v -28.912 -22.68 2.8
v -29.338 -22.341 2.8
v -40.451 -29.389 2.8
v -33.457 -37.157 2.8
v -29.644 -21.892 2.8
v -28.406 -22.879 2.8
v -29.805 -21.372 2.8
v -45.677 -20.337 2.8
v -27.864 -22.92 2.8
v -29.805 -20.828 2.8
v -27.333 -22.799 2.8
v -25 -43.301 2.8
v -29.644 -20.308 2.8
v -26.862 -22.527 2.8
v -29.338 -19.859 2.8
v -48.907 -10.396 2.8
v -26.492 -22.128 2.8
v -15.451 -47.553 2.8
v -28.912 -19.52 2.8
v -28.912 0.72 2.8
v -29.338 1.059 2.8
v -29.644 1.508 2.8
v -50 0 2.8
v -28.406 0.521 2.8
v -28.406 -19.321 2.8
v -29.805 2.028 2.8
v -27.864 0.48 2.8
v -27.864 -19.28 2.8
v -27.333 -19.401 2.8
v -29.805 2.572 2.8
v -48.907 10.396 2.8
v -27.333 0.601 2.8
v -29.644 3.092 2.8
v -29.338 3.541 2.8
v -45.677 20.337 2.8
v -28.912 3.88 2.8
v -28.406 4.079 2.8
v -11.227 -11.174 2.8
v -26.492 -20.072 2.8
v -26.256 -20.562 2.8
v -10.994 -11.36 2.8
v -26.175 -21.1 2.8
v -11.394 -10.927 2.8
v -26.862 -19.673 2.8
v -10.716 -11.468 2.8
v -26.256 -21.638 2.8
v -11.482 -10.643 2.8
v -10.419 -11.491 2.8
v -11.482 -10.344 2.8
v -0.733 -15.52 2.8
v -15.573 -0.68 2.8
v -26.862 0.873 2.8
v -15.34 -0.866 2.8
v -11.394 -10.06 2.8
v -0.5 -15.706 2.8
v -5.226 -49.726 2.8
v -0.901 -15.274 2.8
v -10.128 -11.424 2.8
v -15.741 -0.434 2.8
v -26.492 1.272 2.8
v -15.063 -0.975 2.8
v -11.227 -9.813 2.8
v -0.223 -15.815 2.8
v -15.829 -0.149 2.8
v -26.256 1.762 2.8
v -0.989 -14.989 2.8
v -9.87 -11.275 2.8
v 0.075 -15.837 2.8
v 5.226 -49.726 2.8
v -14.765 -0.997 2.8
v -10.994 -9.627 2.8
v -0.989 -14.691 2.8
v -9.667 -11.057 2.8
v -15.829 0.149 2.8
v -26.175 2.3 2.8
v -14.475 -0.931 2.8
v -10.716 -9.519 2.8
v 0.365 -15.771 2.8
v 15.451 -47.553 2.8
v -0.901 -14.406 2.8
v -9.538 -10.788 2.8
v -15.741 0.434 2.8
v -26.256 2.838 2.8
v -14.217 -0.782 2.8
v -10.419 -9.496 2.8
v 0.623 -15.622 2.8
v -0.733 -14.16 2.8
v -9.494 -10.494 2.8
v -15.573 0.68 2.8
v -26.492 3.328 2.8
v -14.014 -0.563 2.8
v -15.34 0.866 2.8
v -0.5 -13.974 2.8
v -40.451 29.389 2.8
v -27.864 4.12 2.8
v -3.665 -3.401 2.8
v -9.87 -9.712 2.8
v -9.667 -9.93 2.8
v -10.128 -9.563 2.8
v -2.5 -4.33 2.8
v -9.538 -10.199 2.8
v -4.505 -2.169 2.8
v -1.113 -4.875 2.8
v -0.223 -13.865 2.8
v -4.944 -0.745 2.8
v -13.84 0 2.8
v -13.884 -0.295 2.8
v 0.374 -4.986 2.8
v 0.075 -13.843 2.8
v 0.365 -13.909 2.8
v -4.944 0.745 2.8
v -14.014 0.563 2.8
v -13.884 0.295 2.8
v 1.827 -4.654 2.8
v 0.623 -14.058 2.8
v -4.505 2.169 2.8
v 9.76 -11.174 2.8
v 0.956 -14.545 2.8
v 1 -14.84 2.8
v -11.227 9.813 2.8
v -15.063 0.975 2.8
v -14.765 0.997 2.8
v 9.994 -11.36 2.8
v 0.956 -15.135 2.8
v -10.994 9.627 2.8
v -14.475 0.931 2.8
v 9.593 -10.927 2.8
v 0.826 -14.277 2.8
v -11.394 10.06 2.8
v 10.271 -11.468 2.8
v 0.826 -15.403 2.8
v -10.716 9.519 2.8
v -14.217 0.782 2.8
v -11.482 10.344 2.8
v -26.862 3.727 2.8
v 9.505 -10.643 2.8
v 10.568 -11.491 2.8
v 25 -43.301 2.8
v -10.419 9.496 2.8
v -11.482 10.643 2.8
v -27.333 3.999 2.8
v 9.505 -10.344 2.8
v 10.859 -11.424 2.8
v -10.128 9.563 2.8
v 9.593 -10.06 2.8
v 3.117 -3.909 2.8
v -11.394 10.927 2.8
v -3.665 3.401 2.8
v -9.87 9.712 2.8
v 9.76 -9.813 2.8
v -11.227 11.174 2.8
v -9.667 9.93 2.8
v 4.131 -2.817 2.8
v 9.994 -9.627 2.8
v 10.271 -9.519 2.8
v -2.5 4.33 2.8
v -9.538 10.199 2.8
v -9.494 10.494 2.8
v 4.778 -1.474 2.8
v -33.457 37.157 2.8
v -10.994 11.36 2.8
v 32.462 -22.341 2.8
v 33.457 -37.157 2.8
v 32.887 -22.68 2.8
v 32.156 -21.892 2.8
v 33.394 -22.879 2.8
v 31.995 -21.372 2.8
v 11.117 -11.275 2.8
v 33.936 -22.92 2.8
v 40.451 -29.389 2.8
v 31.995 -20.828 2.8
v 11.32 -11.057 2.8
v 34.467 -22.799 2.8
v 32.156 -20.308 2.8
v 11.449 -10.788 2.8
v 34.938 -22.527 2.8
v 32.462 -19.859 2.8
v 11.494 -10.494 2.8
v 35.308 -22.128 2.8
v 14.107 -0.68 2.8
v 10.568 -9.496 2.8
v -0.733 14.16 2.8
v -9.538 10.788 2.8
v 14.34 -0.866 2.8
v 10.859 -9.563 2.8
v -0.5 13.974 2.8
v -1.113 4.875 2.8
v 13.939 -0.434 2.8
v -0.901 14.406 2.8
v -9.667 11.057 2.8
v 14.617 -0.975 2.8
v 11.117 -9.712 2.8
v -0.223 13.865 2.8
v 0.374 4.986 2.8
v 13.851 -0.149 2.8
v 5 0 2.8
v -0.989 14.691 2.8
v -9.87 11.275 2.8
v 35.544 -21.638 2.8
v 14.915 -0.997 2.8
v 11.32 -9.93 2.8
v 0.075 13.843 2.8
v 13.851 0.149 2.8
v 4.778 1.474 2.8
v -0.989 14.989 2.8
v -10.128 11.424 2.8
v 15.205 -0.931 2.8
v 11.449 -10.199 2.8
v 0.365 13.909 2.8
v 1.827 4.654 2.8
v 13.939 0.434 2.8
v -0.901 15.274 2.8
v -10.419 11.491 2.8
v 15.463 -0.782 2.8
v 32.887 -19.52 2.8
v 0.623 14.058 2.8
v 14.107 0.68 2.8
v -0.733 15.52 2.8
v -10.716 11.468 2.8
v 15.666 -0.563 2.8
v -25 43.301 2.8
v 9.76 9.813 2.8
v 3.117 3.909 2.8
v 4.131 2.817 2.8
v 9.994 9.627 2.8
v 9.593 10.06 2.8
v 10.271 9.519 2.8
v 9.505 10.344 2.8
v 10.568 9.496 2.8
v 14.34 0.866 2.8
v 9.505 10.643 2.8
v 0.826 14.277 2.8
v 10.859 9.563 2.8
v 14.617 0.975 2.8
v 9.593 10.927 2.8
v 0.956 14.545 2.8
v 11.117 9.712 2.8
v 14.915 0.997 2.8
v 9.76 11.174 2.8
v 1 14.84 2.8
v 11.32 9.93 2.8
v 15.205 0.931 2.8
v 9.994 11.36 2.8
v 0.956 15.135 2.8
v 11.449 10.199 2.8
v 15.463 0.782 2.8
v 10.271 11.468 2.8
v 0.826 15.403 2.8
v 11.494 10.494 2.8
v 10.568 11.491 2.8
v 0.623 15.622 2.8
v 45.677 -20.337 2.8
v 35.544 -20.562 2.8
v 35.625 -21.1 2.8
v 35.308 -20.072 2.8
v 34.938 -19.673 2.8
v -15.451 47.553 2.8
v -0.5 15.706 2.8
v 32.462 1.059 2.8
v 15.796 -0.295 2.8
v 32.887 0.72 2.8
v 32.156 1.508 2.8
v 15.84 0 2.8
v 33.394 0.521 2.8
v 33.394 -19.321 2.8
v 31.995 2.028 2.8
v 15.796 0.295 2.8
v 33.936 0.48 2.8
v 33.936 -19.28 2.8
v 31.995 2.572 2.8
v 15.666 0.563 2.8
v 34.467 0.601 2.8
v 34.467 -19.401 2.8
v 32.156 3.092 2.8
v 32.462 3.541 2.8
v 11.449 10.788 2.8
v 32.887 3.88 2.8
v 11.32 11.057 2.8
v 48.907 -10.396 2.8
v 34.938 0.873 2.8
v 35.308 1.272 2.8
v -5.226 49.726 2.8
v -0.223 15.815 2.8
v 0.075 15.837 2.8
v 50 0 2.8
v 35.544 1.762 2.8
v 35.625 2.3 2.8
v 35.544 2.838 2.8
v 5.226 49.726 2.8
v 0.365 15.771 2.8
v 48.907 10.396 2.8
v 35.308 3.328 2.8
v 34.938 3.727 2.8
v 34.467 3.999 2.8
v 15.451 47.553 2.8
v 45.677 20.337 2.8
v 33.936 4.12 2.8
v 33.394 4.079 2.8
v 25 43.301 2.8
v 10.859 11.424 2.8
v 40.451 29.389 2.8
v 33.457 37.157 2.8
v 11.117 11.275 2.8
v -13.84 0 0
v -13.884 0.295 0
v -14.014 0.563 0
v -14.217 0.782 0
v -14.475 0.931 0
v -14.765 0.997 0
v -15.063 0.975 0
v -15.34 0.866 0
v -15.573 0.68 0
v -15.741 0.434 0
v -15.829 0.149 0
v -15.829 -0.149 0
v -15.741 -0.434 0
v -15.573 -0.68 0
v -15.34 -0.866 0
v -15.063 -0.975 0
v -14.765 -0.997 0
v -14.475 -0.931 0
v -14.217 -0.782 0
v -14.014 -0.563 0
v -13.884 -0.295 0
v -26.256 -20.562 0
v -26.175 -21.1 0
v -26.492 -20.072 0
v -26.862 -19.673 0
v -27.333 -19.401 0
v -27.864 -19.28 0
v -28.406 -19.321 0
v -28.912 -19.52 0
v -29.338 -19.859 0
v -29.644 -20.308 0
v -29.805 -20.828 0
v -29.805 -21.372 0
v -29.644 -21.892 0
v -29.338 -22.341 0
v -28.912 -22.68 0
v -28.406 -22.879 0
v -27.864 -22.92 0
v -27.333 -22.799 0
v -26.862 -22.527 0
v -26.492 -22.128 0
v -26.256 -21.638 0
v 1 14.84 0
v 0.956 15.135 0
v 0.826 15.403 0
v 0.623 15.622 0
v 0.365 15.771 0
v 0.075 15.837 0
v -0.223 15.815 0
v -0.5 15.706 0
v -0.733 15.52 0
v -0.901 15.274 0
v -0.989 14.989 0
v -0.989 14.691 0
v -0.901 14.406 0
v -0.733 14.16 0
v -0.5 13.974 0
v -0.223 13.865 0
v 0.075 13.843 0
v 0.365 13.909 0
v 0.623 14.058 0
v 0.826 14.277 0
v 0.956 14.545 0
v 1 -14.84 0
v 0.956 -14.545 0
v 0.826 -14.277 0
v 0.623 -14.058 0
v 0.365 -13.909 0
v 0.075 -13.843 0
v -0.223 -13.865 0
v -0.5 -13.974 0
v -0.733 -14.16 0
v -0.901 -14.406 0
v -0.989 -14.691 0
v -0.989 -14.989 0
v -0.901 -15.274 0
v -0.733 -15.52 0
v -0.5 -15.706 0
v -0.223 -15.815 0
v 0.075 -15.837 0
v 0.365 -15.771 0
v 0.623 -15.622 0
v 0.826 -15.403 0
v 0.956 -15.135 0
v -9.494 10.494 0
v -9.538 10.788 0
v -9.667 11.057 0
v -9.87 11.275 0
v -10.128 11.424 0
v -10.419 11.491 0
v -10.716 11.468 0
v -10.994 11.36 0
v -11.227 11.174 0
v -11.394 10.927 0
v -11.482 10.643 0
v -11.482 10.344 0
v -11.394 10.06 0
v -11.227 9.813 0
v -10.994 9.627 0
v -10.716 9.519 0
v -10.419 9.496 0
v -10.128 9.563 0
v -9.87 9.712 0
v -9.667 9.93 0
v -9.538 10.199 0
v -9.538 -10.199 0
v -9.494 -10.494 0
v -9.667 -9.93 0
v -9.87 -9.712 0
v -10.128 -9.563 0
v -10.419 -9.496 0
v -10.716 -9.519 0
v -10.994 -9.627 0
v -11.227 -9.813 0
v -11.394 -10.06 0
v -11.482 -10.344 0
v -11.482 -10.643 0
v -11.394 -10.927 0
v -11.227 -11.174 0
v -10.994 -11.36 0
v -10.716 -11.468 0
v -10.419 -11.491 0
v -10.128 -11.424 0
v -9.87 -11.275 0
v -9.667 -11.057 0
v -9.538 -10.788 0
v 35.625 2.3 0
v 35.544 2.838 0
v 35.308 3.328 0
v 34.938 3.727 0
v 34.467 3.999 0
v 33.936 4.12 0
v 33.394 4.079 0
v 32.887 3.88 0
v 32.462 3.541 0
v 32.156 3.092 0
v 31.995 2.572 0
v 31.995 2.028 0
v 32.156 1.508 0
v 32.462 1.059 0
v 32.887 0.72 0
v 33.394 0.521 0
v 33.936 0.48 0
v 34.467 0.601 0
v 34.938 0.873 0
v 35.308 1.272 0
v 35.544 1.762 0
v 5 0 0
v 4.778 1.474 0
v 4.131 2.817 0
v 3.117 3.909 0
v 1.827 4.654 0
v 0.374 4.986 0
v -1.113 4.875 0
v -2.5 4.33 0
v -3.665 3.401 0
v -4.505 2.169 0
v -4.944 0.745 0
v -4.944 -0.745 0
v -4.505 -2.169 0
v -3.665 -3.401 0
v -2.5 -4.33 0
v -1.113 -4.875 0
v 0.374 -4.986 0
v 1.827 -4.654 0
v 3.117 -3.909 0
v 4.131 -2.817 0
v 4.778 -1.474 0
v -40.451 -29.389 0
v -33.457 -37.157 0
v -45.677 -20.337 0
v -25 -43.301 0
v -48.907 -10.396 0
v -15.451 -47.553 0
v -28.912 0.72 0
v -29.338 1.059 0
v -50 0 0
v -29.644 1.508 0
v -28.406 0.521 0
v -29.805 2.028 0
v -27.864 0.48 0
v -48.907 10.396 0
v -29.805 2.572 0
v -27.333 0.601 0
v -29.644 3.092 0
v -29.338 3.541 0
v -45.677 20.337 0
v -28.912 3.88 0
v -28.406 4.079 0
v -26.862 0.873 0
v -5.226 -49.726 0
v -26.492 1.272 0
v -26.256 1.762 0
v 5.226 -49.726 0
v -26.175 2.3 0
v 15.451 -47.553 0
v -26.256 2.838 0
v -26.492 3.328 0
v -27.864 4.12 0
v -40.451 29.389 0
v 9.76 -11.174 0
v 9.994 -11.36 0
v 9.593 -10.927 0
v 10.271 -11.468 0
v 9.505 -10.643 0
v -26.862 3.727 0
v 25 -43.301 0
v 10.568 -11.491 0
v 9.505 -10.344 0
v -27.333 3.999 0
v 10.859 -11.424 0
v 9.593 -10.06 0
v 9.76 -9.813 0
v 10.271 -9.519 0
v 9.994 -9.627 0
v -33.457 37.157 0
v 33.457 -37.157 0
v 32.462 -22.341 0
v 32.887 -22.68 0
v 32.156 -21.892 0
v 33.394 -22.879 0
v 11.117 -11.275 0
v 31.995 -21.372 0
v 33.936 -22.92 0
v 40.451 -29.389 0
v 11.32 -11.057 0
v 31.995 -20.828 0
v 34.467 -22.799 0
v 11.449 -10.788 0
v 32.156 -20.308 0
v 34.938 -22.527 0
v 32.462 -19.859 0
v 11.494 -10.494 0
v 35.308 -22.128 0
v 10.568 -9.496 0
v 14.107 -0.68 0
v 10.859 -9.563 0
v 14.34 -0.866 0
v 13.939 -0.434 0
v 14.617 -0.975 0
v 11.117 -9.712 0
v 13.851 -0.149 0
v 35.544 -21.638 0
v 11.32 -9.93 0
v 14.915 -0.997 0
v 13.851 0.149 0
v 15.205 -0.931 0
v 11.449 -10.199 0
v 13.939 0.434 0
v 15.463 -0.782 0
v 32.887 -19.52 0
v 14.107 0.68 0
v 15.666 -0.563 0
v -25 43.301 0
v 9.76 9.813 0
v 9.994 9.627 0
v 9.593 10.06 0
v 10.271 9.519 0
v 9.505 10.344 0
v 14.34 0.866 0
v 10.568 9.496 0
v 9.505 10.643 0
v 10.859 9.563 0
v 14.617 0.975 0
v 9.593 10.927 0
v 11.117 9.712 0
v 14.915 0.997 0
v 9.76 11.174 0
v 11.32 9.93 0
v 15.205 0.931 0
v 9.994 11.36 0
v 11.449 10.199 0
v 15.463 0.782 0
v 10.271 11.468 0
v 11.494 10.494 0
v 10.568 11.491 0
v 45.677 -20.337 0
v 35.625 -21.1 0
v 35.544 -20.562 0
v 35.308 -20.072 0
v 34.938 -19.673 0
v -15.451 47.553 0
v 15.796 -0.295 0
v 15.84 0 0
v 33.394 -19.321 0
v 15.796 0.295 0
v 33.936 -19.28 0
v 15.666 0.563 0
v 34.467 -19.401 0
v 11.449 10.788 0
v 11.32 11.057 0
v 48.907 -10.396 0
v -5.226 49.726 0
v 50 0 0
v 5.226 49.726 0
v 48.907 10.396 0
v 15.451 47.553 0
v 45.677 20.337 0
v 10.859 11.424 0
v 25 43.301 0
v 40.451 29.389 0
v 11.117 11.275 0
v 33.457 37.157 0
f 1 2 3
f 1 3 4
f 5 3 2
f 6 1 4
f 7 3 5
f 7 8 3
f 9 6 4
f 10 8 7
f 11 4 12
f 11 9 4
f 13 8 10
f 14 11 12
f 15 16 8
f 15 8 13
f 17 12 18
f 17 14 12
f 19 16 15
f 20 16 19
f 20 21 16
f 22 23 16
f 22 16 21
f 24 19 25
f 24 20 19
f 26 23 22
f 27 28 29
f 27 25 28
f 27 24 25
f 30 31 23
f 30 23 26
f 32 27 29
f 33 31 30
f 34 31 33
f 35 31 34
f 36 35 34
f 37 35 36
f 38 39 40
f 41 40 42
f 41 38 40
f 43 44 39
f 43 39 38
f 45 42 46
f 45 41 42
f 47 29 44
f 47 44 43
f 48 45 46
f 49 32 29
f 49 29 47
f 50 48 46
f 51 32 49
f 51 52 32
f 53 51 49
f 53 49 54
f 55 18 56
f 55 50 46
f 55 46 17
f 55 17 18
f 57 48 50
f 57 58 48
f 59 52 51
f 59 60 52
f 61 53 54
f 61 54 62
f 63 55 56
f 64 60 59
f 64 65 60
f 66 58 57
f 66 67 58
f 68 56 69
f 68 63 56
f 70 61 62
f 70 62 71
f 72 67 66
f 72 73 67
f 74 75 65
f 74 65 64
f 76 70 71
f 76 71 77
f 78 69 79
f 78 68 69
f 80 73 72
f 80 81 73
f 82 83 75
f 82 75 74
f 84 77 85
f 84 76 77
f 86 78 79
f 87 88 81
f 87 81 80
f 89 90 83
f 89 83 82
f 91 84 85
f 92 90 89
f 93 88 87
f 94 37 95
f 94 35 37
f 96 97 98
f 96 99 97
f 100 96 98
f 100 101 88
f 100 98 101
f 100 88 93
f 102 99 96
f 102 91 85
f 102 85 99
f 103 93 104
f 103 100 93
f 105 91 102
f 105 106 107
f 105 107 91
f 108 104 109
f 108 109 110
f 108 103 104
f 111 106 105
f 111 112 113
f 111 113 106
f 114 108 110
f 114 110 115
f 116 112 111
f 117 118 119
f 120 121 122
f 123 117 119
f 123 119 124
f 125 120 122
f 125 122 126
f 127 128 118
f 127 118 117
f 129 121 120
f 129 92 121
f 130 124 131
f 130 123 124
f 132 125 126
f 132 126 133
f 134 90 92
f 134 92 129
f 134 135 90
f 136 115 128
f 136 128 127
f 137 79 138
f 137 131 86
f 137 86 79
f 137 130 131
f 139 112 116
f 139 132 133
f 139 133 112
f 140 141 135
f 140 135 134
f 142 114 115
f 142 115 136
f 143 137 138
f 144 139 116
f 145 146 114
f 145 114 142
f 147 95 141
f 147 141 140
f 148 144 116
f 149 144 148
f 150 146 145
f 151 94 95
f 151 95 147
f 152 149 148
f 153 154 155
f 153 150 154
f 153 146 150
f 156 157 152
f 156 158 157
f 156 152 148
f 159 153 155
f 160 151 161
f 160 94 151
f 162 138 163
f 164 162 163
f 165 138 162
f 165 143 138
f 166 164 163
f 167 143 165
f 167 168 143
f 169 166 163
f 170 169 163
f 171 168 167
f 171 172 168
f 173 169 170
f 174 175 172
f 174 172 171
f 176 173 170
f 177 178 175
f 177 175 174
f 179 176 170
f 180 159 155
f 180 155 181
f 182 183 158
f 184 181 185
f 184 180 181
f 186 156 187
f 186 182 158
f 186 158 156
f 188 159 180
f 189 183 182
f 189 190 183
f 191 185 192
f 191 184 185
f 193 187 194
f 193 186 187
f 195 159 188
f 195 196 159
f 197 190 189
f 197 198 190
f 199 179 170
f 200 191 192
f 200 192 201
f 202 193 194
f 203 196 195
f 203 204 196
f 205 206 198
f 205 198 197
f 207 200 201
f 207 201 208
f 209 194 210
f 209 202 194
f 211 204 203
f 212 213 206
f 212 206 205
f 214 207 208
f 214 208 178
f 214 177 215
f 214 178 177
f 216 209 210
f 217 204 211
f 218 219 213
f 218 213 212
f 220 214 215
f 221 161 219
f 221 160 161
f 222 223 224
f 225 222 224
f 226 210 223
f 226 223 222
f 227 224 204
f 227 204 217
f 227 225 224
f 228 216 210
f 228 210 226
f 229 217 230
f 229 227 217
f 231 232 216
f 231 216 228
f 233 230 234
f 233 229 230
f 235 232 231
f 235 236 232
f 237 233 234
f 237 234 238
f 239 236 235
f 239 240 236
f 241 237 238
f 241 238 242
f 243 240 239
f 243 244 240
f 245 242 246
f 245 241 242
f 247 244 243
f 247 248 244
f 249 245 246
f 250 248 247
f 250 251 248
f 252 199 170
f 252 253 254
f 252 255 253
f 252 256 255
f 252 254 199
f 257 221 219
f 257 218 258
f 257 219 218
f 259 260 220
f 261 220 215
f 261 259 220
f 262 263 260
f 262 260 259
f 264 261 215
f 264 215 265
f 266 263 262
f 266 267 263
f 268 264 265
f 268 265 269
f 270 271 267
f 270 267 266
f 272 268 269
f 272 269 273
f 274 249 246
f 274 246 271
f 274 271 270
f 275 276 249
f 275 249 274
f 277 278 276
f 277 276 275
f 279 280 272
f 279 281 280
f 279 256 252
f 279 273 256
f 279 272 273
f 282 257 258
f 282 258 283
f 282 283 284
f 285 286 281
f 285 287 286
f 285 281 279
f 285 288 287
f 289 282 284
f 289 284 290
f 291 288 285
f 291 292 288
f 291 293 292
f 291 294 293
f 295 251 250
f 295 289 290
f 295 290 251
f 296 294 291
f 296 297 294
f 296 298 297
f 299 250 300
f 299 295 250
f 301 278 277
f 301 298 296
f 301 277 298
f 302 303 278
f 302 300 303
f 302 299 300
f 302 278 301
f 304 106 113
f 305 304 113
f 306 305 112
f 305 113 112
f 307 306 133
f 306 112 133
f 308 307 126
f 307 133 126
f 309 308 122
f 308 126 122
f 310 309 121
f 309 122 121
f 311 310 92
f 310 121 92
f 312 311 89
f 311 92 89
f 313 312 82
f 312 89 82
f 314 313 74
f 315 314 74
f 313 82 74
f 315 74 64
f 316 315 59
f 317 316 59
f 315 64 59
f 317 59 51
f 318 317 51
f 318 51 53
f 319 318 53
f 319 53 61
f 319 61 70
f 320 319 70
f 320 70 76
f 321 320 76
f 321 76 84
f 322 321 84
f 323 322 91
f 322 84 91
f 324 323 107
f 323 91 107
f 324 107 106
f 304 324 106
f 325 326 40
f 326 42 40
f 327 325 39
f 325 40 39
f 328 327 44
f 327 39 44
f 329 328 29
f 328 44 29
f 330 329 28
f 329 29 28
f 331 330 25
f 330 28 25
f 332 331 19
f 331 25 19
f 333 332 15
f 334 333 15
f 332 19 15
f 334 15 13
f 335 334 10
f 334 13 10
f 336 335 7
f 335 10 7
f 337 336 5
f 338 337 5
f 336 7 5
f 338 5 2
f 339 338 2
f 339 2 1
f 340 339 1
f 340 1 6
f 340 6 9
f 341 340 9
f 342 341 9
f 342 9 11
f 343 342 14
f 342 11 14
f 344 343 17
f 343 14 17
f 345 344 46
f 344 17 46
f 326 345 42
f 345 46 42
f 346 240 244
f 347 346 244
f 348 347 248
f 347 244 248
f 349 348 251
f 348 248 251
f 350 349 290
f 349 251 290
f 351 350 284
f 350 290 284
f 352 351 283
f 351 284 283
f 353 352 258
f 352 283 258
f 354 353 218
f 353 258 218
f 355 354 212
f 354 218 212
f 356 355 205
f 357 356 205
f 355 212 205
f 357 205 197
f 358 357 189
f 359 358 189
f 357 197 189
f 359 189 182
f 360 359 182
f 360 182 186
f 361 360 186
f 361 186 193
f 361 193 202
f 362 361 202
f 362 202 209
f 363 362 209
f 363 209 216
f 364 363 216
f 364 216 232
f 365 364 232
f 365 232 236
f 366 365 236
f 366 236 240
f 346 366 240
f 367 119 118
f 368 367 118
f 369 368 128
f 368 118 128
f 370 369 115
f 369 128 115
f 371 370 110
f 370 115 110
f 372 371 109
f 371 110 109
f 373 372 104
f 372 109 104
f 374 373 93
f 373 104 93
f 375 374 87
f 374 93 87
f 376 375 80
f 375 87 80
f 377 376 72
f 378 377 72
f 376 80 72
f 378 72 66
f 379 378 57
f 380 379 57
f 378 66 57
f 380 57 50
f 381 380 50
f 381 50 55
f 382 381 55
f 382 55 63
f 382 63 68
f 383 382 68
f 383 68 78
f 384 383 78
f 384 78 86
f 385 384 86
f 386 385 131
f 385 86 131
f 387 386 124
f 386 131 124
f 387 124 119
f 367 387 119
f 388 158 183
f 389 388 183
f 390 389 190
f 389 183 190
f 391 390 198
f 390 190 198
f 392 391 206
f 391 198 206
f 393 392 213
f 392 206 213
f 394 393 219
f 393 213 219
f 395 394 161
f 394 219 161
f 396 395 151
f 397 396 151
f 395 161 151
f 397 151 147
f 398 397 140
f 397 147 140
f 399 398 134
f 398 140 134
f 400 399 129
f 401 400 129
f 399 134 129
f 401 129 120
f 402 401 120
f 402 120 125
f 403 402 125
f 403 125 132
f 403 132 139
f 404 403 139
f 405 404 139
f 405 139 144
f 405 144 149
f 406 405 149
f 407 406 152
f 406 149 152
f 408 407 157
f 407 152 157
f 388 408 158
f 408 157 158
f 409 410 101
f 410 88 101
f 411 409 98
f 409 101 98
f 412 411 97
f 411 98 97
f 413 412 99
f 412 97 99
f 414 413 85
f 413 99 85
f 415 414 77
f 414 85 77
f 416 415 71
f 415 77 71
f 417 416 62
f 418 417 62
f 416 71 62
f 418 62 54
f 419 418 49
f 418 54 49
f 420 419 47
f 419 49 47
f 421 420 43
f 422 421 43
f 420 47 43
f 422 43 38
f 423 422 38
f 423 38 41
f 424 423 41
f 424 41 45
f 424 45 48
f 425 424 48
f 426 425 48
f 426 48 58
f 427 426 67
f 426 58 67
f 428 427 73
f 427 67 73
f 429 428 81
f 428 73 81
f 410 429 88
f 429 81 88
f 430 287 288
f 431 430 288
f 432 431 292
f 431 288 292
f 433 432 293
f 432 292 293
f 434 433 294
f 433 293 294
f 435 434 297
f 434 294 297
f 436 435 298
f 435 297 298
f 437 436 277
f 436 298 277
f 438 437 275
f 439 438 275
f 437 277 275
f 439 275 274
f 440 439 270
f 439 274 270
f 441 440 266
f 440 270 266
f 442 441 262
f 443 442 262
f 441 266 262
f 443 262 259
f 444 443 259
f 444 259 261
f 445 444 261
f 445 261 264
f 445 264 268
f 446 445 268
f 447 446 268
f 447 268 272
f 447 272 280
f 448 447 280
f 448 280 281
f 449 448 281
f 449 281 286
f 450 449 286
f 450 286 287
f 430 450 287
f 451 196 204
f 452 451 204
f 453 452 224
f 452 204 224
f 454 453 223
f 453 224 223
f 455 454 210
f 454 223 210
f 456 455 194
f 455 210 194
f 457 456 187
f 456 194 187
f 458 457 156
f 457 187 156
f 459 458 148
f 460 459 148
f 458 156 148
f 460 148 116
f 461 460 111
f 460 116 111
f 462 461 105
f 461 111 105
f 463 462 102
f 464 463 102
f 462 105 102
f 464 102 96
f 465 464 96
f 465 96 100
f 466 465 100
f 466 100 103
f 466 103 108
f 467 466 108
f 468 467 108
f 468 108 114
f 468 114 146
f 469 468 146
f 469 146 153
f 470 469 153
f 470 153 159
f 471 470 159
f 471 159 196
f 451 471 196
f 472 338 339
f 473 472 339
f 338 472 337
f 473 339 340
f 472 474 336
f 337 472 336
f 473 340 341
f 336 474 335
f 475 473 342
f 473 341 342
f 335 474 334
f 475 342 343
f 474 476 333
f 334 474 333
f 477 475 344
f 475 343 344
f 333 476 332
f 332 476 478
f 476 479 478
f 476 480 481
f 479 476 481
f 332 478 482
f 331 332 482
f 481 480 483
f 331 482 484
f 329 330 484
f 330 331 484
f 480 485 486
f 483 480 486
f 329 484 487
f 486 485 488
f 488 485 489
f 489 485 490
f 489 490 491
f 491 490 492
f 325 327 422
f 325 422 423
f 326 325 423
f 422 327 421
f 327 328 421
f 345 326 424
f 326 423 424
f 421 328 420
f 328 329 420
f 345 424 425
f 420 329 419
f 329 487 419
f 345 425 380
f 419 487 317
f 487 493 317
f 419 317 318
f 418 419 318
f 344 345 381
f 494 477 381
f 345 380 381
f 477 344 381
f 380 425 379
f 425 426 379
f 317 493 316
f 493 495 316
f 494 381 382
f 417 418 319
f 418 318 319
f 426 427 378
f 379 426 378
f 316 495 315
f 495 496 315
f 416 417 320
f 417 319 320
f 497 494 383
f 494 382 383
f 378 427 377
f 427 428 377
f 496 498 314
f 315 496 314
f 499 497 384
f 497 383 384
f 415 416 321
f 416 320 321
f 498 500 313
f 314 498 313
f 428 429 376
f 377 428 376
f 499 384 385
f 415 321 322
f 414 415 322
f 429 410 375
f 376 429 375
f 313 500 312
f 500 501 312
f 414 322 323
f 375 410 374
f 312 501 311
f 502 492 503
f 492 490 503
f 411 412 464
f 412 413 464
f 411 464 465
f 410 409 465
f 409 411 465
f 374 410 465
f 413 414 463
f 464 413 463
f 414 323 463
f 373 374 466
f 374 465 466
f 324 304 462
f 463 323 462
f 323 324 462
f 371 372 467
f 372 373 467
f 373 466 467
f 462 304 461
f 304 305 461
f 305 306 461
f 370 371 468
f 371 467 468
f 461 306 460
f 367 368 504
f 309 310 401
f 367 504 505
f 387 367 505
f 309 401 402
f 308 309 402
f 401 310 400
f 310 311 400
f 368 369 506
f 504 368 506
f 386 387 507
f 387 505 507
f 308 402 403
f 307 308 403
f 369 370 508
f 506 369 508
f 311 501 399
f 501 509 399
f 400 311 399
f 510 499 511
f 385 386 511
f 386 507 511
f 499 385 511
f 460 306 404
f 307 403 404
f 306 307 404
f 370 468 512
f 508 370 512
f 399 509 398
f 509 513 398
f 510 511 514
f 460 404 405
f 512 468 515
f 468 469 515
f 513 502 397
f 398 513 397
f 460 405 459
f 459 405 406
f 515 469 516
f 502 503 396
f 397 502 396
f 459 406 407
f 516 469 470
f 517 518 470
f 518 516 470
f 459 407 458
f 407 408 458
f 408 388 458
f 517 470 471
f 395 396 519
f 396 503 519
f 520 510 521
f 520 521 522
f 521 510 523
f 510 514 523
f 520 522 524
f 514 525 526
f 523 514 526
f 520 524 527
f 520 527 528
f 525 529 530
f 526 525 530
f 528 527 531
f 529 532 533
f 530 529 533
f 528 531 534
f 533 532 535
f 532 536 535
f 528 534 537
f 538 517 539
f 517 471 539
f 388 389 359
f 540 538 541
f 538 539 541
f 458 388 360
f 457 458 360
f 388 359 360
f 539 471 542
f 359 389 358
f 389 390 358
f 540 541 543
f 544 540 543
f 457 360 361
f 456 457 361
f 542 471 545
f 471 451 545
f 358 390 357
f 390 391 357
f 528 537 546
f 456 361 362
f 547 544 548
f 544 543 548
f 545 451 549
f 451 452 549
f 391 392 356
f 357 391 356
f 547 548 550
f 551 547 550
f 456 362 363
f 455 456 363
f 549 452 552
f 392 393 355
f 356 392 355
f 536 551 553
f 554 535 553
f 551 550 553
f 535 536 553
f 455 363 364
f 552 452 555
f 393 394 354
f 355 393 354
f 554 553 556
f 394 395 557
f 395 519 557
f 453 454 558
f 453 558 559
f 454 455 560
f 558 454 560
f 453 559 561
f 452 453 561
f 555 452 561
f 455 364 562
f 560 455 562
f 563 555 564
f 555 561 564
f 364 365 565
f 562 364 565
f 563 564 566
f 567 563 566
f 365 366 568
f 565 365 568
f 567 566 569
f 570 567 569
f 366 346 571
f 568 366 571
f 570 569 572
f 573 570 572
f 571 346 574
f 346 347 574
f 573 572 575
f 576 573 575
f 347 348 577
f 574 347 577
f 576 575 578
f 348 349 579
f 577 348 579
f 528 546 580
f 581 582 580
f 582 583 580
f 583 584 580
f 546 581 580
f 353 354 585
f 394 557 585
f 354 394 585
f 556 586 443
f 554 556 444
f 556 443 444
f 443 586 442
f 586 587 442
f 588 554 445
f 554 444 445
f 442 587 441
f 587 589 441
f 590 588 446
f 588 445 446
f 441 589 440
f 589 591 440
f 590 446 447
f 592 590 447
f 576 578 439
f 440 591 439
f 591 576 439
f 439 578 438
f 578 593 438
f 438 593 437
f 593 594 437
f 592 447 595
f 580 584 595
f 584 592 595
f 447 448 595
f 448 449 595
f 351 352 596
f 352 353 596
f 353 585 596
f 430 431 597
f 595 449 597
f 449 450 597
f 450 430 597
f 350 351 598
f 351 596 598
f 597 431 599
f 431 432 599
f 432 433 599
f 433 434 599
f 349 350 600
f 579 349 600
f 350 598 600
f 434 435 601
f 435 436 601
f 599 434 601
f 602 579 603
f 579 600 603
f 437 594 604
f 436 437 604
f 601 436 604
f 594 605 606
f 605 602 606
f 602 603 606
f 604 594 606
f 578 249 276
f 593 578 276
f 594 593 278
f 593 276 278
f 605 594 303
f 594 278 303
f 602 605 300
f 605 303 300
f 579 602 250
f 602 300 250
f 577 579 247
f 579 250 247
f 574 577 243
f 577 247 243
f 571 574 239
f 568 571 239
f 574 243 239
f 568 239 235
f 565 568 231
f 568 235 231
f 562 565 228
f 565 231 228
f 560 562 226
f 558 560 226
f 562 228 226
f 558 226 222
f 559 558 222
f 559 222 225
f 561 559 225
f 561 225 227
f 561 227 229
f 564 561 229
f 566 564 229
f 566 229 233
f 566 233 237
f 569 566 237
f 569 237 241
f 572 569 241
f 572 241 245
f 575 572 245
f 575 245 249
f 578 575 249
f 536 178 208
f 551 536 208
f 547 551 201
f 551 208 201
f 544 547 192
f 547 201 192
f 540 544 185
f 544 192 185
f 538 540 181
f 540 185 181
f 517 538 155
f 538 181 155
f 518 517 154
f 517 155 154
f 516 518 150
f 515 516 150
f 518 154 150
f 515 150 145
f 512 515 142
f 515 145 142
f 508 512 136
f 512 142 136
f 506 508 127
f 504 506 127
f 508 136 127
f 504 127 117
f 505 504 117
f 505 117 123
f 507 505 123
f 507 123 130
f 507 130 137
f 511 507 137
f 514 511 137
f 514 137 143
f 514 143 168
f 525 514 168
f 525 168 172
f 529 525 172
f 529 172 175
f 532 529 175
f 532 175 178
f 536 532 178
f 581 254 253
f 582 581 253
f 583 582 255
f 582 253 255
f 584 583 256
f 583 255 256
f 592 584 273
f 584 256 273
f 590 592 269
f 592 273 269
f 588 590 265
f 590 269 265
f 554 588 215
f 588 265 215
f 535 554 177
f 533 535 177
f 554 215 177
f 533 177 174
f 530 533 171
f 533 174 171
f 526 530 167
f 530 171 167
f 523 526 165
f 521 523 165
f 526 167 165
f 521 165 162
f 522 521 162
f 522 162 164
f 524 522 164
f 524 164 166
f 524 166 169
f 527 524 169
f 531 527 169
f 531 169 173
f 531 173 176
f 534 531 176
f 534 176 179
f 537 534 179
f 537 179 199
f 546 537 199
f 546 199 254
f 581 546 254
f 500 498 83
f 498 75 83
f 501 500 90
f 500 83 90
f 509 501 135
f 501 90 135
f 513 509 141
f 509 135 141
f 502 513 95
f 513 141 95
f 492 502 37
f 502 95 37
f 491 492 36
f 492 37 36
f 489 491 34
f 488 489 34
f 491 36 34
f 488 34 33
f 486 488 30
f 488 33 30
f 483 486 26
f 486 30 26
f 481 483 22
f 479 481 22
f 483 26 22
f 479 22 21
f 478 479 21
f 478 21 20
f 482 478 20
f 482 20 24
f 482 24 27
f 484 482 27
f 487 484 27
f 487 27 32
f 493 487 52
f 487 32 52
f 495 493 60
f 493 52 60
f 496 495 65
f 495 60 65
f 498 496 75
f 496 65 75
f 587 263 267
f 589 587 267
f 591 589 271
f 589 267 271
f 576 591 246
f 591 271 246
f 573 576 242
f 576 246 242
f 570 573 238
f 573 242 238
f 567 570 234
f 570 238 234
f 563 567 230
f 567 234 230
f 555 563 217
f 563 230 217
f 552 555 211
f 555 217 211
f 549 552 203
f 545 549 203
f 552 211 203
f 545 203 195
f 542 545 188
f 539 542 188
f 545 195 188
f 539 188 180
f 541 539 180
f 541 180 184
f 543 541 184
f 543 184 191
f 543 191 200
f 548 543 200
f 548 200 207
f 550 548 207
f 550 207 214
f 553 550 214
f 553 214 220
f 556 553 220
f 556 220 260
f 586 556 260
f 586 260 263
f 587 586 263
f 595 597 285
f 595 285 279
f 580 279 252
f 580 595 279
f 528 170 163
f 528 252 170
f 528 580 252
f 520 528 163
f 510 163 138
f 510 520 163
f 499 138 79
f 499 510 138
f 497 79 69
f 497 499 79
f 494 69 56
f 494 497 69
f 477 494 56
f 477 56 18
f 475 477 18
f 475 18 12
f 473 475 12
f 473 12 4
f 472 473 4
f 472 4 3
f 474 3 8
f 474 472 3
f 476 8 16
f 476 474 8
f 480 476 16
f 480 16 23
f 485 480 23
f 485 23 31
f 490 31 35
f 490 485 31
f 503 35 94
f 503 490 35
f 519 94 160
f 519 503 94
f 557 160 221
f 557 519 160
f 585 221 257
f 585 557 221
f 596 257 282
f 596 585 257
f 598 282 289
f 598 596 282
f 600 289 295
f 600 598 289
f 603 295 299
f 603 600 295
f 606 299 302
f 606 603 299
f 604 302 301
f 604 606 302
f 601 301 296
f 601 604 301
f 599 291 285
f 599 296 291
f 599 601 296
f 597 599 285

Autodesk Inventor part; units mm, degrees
ref_plane "YZ Plane" through (0, 0, 0) normal (1, 0, 0) x (0, 1, 0)
ref_plane "XZ Plane" through (0, 0, 0) normal (0, 1, 0) x (-1, 0, 0)
ref_plane "XY Plane" through (0, 0, 0) normal (0, 0, 1) x (1, 0, 0)
sketch "Sketch1" plane through (0, 0, 0) normal (0, 0, 1) x (1, 0, 0)
  circle A0 centre (0, 0) radius 50
  dimension "d0" = 100
extrude "Extrusion1" add sketch "Sketch1" along normal blind 2.8
sketch "Sketch2" plane through (0, 0, 2.8) normal (0, 0, 1) x (1, 0, 0)
  circle A0 centre (0, 0) radius 50 projected
  circle A1 centre (0, 0) radius 5
  dimension "d3" = 10
extrude "Extrusion2" cut sketch "Sketch2" against normal through all contours A1
sketch "Sketch3" plane through (0, 0, 2.8) normal (0, 0, 1) x (1, 0, 0)
  circle A0 centre (0, 0) radius 5 projected
  line L0 (-70, 0) -> (70, 0) projected
  line L1 (0, -70) -> (0, 70) projected
  circle A1 centre (0, 14.84) radius 1
  circle A2 centre (-10.4935, 10.4935) radius 1
  circle A3 centre (-14.84, 0) radius 1
  circle A4 centre (-10.4935, -10.4935) radius 1
  circle A5 centre (0, -14.84) radius 1
  circle A6 centre (10.4935, -10.4935) radius 1
  circle A7 centre (14.84, 0) radius 1
  circle A8 centre (10.4935, 10.4935) radius 1
  circle A9 centre (-28, 2.3) radius 1.825
  circle A10 centre (-28, -21.1) radius 1.825
  circle A11 centre (33.8, -21.1) radius 1.825
  circle A12 centre (33.8, 2.3) radius 1.825
  dimension "d6" = 2
  dimension "d7" = 14.84
  dimension "d10" = 360
extrude "Extrusion3" cut sketch "Sketch3" against normal through all contours A5 L1 | L1 A5 | A3 L0 | L0 A3 | A1 L1 | L1 A1 | A7 L0 | L0 A7 | A2 | A4 | A6 | A8 | A9 | A10 | A11 | A12
properties part number "Acrylic_rotationServoTray"
